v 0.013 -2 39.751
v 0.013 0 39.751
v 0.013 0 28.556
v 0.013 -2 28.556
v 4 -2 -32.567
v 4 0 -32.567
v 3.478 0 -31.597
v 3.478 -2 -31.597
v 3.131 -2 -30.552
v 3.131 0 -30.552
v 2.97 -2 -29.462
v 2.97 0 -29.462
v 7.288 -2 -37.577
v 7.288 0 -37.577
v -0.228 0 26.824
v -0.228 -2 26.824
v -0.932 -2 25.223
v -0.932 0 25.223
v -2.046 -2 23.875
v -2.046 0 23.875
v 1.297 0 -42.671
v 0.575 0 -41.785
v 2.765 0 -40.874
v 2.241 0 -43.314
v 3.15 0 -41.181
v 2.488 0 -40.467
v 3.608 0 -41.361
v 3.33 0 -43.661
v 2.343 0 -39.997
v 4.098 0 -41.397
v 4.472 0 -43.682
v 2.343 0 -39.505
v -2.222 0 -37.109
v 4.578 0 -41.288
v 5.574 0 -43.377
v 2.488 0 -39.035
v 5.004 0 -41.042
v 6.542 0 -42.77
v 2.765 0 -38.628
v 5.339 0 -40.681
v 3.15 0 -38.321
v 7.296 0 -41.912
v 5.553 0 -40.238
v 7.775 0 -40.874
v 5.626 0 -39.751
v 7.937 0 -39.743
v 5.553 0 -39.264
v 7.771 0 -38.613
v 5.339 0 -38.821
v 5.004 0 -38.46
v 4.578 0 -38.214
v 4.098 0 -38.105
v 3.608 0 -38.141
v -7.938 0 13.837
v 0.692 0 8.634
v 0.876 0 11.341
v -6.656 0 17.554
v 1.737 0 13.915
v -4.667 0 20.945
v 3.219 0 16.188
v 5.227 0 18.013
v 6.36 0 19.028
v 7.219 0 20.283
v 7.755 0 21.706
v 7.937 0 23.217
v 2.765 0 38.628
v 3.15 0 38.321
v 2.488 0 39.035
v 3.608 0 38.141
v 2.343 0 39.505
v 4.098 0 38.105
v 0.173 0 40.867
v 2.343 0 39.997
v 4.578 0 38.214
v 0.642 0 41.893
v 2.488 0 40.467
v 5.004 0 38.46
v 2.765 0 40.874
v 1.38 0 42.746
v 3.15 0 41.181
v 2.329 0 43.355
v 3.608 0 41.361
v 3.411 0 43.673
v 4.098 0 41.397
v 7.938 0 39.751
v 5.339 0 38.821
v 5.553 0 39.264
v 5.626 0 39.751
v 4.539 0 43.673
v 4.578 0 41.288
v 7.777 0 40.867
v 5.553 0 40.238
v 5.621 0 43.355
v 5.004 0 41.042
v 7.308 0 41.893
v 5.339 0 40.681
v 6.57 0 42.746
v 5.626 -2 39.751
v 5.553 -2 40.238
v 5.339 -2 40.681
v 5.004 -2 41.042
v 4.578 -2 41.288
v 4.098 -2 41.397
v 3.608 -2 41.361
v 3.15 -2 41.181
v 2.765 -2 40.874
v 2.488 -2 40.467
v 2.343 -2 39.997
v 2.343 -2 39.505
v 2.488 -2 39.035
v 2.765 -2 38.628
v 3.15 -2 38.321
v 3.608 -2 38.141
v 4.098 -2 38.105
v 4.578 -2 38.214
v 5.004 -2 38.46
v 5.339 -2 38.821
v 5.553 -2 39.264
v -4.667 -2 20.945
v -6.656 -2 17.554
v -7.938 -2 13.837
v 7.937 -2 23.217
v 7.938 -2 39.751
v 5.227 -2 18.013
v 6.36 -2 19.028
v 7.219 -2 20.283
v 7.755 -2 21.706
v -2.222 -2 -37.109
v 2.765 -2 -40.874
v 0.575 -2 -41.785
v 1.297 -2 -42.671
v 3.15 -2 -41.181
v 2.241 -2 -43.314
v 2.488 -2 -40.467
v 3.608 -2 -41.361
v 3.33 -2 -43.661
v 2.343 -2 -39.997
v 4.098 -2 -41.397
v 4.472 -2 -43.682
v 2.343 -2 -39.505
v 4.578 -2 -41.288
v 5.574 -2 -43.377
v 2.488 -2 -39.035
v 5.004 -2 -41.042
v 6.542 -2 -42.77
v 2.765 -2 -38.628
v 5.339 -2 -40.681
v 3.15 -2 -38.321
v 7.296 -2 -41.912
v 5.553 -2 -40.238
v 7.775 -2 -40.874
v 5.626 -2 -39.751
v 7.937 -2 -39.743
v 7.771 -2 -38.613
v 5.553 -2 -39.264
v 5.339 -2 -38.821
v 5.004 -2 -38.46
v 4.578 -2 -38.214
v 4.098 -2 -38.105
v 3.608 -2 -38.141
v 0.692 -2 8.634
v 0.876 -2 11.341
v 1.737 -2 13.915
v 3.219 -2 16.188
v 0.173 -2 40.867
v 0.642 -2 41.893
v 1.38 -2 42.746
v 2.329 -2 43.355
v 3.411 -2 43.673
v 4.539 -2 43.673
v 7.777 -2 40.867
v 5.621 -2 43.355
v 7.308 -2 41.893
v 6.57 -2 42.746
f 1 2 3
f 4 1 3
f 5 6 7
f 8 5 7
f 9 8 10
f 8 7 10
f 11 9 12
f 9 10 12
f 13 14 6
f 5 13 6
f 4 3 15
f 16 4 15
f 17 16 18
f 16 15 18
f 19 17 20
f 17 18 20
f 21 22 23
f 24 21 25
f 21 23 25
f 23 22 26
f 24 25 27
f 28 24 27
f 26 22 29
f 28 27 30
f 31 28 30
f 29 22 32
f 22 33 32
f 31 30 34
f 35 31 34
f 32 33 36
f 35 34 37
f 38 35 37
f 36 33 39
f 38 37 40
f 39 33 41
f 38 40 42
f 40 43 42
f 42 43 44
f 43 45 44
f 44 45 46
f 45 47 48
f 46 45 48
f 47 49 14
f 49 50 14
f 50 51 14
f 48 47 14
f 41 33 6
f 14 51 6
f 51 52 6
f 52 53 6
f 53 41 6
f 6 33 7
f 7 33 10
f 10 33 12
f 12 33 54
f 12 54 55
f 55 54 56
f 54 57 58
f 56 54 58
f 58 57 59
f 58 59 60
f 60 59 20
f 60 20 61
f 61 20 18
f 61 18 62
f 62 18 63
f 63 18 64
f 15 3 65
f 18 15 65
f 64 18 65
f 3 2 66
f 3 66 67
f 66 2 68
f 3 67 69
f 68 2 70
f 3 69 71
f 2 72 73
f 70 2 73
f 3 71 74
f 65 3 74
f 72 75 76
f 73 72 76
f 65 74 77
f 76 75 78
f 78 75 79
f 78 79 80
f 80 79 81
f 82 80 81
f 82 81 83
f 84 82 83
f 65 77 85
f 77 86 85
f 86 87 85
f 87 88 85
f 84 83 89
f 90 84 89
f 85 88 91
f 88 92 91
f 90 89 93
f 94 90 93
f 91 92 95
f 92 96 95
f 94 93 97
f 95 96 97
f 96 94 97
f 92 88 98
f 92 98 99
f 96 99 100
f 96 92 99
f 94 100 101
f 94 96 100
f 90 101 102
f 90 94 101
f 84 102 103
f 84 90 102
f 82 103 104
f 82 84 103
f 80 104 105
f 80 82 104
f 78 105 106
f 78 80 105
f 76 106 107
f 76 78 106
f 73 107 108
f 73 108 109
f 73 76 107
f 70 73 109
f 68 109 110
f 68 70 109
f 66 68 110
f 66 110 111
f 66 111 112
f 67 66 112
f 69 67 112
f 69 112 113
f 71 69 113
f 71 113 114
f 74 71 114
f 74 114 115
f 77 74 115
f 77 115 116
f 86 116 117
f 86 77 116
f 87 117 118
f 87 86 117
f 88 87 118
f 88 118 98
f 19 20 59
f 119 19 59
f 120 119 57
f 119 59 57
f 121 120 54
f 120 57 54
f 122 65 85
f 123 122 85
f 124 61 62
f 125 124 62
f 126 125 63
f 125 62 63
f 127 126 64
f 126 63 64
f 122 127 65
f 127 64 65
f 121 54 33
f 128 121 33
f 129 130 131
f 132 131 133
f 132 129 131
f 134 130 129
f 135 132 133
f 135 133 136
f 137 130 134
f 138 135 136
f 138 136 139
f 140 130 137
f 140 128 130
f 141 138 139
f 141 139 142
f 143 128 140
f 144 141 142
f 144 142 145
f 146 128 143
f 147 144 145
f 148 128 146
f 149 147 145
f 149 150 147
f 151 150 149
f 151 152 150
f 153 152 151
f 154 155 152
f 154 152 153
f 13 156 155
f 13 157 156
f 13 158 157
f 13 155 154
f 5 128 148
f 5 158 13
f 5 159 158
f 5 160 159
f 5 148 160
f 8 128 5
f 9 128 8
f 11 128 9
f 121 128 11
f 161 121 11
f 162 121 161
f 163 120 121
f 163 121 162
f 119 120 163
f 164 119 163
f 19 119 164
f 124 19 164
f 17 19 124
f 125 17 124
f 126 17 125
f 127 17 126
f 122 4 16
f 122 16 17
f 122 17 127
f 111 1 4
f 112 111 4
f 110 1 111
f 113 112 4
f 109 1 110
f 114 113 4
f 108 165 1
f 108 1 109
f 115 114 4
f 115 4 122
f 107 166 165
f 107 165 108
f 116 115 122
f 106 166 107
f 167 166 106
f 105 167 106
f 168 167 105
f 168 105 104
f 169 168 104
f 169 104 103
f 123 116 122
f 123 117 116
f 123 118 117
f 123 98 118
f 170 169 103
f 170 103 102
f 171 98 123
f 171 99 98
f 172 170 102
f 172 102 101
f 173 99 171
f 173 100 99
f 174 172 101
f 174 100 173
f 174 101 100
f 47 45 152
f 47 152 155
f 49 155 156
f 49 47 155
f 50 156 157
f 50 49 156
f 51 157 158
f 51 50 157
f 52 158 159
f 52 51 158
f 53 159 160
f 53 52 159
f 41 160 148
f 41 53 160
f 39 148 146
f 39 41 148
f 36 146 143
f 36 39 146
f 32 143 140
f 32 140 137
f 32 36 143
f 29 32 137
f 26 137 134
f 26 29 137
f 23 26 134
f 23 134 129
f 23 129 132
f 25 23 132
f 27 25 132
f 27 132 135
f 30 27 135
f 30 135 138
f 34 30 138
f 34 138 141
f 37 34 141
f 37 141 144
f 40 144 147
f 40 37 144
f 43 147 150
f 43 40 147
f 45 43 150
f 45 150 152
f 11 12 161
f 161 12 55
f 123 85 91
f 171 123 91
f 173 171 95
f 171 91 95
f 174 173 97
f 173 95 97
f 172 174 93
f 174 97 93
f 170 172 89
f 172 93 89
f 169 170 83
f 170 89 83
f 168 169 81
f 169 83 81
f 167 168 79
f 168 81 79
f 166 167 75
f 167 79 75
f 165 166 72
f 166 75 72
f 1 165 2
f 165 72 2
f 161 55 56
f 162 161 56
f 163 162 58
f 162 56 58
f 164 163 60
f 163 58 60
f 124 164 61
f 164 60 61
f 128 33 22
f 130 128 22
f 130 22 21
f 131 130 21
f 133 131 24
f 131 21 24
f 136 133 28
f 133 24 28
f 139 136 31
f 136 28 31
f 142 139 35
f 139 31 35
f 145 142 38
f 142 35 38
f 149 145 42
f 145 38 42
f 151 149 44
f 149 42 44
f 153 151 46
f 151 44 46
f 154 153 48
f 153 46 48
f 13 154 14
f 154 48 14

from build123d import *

# Parameters (mm, degrees)
F0_R     = 1.651
F1_DEPTH = 2


# Not quite as in the source:
# - ends of sketch curves that miss each other by under 0.0002 mm in the source are joined


with BuildPart() as f1:
    # F0 (on Front) → F1 (new body)
    with BuildSketch(Plane.XZ):
        with BuildLine():
            Line((7.937499, 23.216594), (7.937501, 39.751))
            ThreePointArc((7.937501, 39.751), (3.975101, 43.7134), (0.012701, 39.751))
            Line((0.012701, 39.751), (0.0127, 28.556342))
            ThreePointArc((0.0127, 28.556342), (-0.524833277, 25.999444372), (-2.046427009, 23.8754340098))
            ThreePointArc((-2.046427009, 23.8754340098), (-5.7457403837, 19.2987254647), (-7.9375015933, 13.8372821405))
            Line((-7.9375015933, 13.8372821405), (-2.222499, -37.1094))
            Line((-2.222499, -37.1094), (0.574712, -41.785211))
            ThreePointArc((0.574712, -41.785211), (6.0796125104, -43.1083226832), (7.2879037085, -37.5770851913))
            Line((7.2879037085, -37.5770851913), (4.000105, -32.566839))
            ThreePointArc((4.000105, -32.566839), (3.2819142622, -31.0818977846), (2.97042001, -29.4620769994))
            Line((2.97042001, -29.4620769994), (0.692124, 8.634151))
            ThreePointArc((0.692124, 8.634151), (1.7368417824, 13.9147568002), (5.2269018653, 18.0130141926))
            ThreePointArc((5.2269018653, 18.0130141926), (7.2192261395, 20.2829710591), (7.937499, 23.216594))
        make_face()
        with Locations((3.975094, -39.751)):
            Circle(F0_R, mode=Mode.SUBTRACT)
        with Locations((3.975101, 39.751)):
            Circle(F0_R, mode=Mode.SUBTRACT)
    extrude(amount=F1_DEPTH)


solid = f1.part
